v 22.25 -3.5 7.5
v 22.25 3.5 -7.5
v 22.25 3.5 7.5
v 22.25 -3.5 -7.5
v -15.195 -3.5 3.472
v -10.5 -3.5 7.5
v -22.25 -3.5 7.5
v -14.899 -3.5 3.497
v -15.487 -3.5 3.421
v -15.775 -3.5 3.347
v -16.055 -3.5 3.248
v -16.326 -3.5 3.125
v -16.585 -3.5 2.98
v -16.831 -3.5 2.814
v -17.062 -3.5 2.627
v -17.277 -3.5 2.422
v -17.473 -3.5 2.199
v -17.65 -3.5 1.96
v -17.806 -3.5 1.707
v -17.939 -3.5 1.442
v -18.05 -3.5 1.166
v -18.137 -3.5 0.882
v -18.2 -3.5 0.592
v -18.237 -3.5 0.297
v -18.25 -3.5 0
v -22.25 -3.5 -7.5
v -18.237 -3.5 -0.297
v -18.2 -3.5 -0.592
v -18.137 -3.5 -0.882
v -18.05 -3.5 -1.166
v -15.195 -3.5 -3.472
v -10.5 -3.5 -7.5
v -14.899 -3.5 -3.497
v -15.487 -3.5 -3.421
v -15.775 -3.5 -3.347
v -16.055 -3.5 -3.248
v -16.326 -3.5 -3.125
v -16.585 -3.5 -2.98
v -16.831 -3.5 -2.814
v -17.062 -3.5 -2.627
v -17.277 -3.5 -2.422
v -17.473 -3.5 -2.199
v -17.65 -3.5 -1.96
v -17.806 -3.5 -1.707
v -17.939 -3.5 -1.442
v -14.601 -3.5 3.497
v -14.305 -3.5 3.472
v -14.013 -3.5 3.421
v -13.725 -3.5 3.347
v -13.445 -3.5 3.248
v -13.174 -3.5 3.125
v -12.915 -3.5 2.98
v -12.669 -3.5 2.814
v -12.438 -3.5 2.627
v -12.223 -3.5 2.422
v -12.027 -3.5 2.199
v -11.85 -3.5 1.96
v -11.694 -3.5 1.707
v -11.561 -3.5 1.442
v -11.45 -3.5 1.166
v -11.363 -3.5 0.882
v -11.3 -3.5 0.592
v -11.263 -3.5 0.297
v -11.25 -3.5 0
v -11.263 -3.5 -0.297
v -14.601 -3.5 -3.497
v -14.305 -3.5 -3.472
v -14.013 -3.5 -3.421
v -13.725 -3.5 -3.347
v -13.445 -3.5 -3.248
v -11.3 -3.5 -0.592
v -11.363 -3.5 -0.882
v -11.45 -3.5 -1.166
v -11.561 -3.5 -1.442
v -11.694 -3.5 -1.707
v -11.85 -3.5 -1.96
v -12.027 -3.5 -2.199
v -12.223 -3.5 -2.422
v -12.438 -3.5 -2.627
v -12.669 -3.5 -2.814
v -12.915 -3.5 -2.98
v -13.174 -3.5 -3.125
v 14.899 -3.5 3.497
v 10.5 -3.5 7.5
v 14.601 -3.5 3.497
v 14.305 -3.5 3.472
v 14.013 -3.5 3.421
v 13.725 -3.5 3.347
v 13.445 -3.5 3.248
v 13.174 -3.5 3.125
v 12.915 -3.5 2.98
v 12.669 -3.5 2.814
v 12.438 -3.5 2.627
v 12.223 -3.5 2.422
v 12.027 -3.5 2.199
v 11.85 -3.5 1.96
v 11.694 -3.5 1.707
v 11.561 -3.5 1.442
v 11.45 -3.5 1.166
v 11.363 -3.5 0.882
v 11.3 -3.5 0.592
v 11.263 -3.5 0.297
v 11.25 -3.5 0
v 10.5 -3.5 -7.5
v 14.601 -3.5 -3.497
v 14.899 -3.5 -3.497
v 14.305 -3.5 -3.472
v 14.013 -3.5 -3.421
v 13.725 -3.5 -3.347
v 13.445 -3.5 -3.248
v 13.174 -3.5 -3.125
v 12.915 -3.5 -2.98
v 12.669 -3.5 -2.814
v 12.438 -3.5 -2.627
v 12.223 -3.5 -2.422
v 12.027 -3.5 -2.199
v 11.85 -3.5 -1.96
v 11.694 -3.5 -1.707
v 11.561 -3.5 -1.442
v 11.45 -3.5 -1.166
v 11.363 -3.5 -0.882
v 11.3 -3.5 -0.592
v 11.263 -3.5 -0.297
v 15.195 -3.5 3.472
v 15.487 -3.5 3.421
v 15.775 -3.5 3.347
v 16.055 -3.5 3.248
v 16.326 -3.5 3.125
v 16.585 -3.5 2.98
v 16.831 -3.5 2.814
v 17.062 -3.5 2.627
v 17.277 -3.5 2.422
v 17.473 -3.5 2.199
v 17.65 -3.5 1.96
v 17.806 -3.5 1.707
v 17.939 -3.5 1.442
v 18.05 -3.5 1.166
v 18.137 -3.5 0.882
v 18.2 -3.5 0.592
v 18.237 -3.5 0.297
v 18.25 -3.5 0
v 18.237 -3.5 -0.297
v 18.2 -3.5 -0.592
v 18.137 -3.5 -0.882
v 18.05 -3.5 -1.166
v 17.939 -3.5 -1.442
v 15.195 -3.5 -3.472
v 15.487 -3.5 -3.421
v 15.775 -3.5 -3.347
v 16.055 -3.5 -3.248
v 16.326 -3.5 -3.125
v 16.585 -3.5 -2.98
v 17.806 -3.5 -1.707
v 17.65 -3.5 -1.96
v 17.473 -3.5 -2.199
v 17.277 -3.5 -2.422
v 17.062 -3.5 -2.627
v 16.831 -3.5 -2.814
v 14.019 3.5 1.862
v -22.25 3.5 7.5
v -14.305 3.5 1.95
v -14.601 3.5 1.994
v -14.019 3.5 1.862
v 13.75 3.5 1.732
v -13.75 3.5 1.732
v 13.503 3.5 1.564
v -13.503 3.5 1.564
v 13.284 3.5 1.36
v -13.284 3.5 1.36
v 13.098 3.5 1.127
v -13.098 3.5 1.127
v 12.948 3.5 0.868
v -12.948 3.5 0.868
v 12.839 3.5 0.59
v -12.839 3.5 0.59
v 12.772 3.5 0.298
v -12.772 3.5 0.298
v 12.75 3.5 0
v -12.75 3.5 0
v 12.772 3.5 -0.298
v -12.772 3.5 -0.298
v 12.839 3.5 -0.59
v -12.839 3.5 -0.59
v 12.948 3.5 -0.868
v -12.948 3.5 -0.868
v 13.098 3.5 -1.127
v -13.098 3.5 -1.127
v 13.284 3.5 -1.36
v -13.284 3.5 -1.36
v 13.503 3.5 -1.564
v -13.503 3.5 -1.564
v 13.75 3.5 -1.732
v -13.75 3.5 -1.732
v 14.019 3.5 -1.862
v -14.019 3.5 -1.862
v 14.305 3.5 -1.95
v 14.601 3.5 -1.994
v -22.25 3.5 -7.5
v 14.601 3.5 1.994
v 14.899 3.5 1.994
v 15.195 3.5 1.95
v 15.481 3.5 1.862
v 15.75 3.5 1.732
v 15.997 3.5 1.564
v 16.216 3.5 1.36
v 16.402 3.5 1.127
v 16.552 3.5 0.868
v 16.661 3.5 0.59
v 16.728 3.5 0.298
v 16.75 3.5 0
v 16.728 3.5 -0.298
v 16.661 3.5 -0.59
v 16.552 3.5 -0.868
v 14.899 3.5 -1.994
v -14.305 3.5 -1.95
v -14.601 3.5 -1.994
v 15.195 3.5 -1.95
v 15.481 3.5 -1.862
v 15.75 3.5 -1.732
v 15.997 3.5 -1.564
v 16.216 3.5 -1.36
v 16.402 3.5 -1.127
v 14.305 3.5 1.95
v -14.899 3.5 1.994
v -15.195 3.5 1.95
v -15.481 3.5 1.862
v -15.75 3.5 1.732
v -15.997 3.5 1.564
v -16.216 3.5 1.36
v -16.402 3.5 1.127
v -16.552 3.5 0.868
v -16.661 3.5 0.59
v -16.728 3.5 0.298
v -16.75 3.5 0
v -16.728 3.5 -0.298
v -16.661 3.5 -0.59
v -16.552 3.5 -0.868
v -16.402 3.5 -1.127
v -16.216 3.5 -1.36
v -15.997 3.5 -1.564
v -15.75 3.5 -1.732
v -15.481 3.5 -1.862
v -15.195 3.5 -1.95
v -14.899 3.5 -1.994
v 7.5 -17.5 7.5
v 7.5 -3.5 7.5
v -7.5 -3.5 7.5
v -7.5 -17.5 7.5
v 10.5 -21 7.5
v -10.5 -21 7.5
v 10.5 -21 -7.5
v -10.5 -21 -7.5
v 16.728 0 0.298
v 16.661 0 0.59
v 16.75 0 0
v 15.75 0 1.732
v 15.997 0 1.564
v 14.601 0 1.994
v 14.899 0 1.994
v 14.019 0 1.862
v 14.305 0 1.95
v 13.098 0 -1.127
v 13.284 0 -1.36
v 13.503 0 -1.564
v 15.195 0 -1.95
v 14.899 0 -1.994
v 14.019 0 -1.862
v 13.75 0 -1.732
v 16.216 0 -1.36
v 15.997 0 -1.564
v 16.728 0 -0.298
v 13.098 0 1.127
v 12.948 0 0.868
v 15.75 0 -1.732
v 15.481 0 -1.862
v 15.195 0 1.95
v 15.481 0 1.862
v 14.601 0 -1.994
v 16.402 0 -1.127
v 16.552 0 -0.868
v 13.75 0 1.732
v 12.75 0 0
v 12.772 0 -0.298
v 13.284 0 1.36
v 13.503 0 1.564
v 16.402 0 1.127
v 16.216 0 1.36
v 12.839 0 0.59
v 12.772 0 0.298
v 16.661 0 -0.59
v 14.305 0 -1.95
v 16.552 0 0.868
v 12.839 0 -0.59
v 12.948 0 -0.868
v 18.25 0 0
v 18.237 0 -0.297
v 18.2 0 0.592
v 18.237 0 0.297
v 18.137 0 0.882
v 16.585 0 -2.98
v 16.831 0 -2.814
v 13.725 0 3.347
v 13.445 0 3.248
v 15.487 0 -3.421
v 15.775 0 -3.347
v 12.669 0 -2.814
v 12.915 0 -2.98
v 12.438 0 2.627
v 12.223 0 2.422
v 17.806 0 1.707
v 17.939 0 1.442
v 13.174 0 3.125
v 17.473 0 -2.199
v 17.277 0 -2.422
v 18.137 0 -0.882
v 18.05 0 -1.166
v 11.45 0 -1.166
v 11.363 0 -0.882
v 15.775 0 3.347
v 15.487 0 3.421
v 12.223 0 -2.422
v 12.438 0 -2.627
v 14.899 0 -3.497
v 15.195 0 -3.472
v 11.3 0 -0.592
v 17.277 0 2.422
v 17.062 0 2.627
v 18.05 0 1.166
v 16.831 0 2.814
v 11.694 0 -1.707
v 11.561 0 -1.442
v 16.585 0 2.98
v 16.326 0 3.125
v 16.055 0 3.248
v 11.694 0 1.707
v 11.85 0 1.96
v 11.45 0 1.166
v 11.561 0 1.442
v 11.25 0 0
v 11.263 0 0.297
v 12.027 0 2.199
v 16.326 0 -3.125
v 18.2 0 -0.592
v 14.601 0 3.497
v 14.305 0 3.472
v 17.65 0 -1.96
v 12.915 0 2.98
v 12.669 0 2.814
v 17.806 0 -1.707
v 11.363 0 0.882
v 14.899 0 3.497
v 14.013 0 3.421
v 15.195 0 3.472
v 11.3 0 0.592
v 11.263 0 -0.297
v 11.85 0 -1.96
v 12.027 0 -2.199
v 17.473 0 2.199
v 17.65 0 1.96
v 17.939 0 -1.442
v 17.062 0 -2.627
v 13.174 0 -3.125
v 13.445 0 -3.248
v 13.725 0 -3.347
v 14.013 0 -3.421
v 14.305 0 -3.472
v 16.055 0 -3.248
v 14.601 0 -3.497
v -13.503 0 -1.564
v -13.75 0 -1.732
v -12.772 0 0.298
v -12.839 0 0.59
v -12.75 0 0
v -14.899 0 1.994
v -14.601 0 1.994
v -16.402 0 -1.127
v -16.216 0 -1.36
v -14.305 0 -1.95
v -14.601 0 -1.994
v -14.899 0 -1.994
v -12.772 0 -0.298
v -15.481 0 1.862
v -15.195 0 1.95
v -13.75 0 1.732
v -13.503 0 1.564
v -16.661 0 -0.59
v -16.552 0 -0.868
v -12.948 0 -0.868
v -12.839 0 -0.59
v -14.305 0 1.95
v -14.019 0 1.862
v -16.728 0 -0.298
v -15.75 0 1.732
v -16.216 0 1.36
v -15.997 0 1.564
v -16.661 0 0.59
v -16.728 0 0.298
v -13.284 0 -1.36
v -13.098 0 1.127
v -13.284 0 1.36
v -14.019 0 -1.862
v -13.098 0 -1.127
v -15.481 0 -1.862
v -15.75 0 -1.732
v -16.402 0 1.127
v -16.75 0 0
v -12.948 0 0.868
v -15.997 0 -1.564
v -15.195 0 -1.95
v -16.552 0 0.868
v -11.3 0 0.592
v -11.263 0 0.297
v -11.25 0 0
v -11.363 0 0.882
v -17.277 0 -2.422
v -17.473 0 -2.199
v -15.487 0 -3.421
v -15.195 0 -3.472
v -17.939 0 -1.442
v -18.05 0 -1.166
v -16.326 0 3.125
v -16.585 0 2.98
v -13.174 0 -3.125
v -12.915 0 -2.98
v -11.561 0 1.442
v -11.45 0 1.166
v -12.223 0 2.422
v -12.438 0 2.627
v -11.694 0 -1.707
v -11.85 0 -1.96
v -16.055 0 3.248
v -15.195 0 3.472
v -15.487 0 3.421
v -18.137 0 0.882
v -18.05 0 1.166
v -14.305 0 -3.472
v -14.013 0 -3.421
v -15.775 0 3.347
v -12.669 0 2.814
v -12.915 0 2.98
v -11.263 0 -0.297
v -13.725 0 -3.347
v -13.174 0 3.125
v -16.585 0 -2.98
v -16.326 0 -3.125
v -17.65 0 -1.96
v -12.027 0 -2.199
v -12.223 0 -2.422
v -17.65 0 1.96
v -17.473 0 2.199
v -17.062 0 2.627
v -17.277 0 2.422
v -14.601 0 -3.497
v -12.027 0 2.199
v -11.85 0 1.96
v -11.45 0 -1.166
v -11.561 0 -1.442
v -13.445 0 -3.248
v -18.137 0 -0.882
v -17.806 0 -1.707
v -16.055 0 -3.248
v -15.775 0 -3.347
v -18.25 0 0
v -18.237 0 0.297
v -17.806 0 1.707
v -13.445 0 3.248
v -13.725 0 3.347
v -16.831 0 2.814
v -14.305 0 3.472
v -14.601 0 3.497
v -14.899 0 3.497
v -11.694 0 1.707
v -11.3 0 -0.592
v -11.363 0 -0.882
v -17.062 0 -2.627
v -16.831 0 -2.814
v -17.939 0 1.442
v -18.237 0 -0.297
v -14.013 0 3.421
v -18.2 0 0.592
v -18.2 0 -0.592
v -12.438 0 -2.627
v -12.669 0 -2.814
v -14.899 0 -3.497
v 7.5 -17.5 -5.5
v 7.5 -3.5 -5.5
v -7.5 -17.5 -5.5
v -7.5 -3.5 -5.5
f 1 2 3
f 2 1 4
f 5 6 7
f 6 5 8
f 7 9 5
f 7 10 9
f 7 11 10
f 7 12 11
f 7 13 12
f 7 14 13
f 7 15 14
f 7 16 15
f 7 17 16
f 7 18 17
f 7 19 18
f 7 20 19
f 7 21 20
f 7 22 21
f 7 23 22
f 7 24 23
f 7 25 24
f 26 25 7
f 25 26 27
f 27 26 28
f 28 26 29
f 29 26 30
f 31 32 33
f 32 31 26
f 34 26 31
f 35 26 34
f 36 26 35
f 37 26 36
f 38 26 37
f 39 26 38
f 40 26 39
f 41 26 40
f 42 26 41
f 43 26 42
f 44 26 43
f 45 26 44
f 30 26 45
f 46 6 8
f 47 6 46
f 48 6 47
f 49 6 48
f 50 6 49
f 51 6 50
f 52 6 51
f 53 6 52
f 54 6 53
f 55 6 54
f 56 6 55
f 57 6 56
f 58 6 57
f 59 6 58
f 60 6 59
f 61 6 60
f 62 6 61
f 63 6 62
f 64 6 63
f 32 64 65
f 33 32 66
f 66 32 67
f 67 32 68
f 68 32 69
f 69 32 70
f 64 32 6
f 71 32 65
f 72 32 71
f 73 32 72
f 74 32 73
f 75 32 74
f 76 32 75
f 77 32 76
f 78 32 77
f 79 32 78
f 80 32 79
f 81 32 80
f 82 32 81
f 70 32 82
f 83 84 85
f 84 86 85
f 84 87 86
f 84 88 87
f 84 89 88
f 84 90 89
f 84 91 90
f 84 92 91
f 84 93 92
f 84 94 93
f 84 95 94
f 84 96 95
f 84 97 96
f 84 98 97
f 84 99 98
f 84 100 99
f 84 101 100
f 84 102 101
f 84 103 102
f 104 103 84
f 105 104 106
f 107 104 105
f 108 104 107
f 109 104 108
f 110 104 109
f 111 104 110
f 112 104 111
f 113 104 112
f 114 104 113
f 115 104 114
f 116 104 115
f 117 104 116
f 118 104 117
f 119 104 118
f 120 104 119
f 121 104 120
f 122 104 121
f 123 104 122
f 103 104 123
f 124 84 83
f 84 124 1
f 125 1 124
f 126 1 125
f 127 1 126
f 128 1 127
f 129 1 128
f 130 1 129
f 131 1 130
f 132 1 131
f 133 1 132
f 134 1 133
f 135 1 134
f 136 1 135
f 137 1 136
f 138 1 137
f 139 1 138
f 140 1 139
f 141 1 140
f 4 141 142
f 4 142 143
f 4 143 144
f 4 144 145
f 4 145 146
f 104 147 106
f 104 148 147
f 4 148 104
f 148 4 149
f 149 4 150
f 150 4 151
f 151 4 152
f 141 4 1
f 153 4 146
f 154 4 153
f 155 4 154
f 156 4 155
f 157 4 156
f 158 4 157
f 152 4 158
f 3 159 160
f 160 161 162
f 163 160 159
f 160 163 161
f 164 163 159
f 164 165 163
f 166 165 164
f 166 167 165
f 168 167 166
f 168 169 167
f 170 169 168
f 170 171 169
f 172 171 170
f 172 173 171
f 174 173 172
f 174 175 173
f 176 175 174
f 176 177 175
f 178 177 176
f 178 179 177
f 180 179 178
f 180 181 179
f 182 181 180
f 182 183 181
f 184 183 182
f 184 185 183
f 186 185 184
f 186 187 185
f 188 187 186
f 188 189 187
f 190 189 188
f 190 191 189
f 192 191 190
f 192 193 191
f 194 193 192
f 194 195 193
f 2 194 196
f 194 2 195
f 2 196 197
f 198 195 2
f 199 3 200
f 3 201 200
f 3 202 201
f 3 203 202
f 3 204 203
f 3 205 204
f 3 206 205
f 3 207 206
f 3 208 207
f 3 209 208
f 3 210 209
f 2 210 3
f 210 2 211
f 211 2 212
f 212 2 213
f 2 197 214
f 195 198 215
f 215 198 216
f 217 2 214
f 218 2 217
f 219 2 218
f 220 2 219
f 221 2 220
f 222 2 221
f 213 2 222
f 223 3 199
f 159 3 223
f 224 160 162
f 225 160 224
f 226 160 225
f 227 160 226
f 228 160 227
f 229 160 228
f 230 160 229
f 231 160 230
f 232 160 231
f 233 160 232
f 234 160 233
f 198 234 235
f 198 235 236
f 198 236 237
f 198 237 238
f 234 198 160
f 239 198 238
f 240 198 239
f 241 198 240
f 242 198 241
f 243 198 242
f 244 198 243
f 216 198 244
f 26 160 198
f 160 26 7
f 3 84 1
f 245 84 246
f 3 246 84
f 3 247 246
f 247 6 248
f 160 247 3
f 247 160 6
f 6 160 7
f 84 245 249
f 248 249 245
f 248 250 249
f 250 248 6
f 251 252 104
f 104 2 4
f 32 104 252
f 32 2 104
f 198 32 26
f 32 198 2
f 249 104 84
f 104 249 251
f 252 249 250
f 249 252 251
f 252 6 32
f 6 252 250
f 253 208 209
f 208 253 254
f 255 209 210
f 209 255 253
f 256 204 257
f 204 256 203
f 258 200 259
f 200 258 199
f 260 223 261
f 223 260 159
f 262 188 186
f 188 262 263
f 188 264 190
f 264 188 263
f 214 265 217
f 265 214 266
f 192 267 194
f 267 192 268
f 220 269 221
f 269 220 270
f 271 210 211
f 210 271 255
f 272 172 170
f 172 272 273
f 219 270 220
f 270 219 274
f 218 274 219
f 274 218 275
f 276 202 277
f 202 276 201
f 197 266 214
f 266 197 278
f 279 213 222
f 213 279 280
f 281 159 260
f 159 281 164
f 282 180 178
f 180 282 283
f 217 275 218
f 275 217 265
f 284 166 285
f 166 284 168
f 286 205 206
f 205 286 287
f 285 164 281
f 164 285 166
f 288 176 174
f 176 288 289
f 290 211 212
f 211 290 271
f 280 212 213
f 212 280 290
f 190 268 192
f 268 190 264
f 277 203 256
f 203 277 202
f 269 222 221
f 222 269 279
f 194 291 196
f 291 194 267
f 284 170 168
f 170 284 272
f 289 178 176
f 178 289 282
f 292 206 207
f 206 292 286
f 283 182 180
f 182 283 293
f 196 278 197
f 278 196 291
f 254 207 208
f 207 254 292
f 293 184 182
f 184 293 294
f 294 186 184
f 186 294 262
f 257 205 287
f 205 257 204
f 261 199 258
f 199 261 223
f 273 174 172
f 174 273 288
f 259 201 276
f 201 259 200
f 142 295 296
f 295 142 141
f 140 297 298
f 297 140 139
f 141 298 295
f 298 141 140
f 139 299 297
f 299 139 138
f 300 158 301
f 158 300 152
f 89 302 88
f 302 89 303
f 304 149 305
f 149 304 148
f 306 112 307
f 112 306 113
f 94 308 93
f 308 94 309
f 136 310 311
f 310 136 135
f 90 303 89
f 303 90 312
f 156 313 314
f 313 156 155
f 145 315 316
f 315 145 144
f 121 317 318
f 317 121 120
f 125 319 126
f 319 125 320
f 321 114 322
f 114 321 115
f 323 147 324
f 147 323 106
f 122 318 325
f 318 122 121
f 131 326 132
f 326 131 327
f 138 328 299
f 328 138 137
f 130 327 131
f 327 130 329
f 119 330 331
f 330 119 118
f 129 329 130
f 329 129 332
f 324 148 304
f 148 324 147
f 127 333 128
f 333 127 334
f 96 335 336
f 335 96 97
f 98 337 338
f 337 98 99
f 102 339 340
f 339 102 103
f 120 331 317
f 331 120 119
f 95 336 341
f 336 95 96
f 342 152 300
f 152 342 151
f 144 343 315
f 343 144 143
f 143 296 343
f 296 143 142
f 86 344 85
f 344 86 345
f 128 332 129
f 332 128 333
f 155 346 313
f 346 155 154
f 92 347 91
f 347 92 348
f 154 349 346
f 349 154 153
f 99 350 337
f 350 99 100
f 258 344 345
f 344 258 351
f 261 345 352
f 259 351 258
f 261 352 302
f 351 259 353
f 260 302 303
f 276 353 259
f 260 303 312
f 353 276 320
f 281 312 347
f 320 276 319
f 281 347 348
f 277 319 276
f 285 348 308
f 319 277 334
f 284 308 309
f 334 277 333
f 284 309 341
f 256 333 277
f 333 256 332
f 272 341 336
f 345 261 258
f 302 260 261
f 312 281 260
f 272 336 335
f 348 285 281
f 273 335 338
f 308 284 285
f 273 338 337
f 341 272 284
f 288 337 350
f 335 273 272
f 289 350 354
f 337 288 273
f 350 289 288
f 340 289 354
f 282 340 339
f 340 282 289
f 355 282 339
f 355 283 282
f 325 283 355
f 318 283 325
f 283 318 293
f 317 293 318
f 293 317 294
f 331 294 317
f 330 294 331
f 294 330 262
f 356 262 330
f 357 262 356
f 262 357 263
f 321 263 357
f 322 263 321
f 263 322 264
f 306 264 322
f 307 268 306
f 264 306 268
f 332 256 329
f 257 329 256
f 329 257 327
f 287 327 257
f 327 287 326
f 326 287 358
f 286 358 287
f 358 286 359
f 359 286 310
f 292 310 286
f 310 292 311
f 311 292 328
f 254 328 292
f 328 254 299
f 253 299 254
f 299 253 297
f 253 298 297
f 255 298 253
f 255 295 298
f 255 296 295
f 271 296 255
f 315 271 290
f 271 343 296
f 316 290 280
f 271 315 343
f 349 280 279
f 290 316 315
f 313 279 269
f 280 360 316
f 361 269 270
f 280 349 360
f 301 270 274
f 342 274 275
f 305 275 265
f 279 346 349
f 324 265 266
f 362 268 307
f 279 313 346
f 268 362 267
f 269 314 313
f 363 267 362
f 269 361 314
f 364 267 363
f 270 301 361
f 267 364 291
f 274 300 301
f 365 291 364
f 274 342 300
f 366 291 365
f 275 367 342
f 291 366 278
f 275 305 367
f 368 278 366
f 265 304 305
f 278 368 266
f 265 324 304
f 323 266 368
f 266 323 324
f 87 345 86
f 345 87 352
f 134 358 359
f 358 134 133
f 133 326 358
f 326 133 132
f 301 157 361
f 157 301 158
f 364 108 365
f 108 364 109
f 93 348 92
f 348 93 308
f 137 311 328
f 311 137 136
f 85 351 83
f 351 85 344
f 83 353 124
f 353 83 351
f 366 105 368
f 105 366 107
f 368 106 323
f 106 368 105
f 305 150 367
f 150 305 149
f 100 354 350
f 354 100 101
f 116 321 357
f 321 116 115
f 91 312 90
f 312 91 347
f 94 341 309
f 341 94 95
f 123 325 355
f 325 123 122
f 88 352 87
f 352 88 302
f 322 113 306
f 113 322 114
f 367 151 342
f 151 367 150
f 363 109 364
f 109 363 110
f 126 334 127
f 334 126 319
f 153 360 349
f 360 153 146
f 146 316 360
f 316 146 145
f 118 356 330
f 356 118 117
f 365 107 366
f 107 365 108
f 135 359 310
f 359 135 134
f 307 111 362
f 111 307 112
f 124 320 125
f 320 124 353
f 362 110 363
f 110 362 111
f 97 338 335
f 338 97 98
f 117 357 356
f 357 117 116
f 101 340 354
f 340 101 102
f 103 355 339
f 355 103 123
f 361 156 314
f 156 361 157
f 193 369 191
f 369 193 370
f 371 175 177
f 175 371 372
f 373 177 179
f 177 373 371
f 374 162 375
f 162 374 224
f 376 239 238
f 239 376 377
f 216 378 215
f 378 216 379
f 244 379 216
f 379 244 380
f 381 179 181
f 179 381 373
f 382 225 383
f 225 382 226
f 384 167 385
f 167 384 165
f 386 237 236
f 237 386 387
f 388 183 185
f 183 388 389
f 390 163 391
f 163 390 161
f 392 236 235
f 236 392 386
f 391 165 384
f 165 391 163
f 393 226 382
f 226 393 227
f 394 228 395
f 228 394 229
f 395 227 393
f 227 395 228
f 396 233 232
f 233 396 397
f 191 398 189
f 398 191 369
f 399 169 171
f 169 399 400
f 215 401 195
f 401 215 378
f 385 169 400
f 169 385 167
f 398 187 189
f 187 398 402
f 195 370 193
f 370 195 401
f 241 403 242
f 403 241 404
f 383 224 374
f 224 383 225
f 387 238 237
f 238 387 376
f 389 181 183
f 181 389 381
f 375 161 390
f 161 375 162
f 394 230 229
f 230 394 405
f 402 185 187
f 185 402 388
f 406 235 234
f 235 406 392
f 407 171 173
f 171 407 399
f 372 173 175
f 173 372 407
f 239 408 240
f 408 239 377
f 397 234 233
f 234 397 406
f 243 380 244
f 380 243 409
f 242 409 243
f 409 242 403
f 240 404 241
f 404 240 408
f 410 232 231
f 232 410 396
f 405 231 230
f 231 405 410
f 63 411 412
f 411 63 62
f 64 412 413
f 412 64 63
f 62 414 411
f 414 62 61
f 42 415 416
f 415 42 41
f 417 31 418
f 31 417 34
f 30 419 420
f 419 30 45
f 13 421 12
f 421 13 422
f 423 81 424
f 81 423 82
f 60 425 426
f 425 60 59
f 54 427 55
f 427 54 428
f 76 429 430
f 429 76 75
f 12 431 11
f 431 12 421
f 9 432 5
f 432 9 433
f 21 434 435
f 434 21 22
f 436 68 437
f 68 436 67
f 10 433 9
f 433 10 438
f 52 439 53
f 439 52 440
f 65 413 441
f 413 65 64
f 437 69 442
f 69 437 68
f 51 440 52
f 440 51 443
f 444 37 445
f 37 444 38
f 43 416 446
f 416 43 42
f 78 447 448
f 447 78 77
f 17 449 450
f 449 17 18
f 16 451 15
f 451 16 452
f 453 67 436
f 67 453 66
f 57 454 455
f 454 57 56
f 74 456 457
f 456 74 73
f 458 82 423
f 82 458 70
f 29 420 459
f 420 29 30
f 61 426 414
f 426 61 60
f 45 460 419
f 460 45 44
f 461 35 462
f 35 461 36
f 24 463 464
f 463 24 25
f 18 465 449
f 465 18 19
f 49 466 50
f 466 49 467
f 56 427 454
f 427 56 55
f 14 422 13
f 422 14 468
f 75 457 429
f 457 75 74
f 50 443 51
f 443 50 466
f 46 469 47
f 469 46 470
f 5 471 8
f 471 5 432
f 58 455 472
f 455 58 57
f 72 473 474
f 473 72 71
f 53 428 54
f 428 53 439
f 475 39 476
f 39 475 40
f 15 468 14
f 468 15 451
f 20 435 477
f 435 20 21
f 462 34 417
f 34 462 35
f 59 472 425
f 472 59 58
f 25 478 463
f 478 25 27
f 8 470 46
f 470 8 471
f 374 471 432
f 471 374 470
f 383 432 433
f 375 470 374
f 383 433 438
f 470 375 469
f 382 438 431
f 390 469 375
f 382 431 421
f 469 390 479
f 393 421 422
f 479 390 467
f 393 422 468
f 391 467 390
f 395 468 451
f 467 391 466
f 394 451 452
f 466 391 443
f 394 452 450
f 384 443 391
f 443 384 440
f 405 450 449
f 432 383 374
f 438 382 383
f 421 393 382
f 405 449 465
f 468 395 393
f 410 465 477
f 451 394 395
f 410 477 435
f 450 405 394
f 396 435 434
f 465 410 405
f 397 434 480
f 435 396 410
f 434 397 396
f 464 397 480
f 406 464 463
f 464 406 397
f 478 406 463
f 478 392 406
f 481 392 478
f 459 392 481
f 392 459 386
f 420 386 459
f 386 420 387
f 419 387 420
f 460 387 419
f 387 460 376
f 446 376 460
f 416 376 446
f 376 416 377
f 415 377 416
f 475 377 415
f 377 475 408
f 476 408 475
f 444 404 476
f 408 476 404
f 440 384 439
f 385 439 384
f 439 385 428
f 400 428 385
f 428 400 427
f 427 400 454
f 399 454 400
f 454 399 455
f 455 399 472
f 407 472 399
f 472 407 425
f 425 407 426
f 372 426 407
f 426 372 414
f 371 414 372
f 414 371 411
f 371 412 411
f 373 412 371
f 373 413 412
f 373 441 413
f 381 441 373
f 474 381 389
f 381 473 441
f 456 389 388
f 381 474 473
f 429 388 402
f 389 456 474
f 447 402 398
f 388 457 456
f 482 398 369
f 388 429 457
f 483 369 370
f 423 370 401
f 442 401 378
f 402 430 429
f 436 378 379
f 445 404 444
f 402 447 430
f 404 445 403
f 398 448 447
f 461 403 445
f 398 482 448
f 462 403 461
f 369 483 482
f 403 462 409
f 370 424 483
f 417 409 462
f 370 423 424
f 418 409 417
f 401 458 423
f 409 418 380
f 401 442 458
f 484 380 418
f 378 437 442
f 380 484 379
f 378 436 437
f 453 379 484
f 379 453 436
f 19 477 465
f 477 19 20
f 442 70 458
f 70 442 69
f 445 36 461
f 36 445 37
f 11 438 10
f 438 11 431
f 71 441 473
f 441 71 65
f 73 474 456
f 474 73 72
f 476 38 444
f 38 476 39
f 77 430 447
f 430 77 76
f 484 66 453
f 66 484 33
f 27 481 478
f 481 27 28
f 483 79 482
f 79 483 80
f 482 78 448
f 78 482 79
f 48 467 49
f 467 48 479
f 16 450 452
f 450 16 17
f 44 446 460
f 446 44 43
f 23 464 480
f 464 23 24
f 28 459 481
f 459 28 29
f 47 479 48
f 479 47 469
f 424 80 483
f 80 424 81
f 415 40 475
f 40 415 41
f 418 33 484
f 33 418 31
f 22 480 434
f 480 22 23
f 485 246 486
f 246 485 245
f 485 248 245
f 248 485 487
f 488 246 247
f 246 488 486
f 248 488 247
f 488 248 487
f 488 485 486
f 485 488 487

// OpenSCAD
// file: nuts.scad
e = 0.1; // epsilon

// Screws / Nuts
// described by a K-Element vector, offsets defined as follows
nut_diameter_low   = 0;
nut_diameter_high  = 1;
nut_height         = 2;
screw_channel      = 3;
screw_head_channel = 4;
screw_head_height  = 5;
m3 = [ 5.6,  6.5, 2.5, 3.5,  6.0, 2.5];
m4 = [ 7.0,  8.0, 3.5, 4.5,  7.5, 3.0];
m5 = [ 8.0,  9.2, 3.7, 5.0,  9.2, 3.5];
m6 = [10.0, 11.2, 5.0, 6.0, 10.1, 4.0];

module nut_hole (nut, h)
{
    w = (nut [nut_diameter_low] + nut [nut_diameter_high]) / 2;
    translate ([0, 0, h / 2]) difference () {
        cube ([w, 2*w, h], center = true);
        rotate ([0, 0, 30])
            translate ([0, 1.5 * w, 0])
                cube ([2*w, 2*w, h+e], center = true);
        rotate ([0, 0, -30])
            translate ([0, 1.5 * w, 0])
                cube ([2*w, 2*w, h+e], center = true);
        rotate ([0, 0, 30])
            translate ([0, -1.5 * w, 0])
                cube ([2*w, 2*w, h+e], center = true);
        rotate ([0, 0, -30])
            translate ([0, -1.5 * w, 0])
                cube ([2*w, 2*w, h+e], center = true);
    }
}

// A screw channel + cone for a sunk screw, with h2 it can be deeper
// h is the length of the screw, h2 is how far it is sunk in the cone
// height/width only depends on the given nut.
module countersunk_screw_hole (nut, h, h2 = 0)
{
    r2 = (nut [screw_channel] * 1.1) / 2;
    cylinder
        ( r1 = (nut [screw_head_channel] * 1.1) / 2
        , r2 = r2
        , h  = nut [screw_head_height]  * 1.05
        );
    cylinder (r = r2, h = h + nut [screw_head_height]);
    translate ([0, 0, -h2+e])
        cylinder (r = nut [screw_head_channel] * 1.1 / 2, h = h2);
}
//translate ([5, 0, 0])
//    countersunk_screw_hole (m5, 10, 10, $fa = 6, $fs = .5);

// A channel for a sideways embedded nut
// ehf is the factor for the embedded height for the hole of the nut, we
// make it a little wider than nut-height by default, but it can be
// overridden.
// ewf is the factor for the width of the hole (nut diameter * ewf)
module embedded_nut (nut, h, ehf=1.3, ewf=1)
{
    w = (nut [nut_diameter_low] + nut [nut_diameter_high]) / 2;
    union () {
        translate ([0, -w * ewf * 0.5, 0])
            cube ([nut [nut_height] * ehf, w * ewf, h]);
        rotate ([0, 90, 0]) rotate ([0, 0, 30])
            nut_hole (nut, nut [nut_height] * ehf);
    }
}
//embedded_nut (m3, 20);
// main file
include <nuts.scad>

module lock
    ( w=15, l=44.5, h=7
    , hw=11, hl=15, hh=14
    , hod=3.5, hr1=2, hr2=3.5
    , d=7.5, ww=3
    , fhd=.5
    )
{
    difference () {
        union () {
            cube ([l, w, h], center=true);
            translate ([0, 0, (h+hh)/2])
                cube ([hl+2*ww, w, h+hh], center=true);
        }
        translate ([0, 0, (hh+h)/2])
            cube ([hl, hw, hh], center=true);
        for (y = [l/2 - d, -l/2 + d]) {
            translate ([y, 0, -h])
                cylinder (r=hr1,   h=3*h);
            translate ([y, 0, -h/2 + hod])
                cylinder (r=hr2, h=3*h);
        }
        translate ([0, 2*ww, hh/2 + h/2 - fhd + fhd])
            cube ([hl, 3*ww, hh], center=true);
    }
}

rotate ([90, 0, 0])
    lock ($fa=3, $fs=0.3);
